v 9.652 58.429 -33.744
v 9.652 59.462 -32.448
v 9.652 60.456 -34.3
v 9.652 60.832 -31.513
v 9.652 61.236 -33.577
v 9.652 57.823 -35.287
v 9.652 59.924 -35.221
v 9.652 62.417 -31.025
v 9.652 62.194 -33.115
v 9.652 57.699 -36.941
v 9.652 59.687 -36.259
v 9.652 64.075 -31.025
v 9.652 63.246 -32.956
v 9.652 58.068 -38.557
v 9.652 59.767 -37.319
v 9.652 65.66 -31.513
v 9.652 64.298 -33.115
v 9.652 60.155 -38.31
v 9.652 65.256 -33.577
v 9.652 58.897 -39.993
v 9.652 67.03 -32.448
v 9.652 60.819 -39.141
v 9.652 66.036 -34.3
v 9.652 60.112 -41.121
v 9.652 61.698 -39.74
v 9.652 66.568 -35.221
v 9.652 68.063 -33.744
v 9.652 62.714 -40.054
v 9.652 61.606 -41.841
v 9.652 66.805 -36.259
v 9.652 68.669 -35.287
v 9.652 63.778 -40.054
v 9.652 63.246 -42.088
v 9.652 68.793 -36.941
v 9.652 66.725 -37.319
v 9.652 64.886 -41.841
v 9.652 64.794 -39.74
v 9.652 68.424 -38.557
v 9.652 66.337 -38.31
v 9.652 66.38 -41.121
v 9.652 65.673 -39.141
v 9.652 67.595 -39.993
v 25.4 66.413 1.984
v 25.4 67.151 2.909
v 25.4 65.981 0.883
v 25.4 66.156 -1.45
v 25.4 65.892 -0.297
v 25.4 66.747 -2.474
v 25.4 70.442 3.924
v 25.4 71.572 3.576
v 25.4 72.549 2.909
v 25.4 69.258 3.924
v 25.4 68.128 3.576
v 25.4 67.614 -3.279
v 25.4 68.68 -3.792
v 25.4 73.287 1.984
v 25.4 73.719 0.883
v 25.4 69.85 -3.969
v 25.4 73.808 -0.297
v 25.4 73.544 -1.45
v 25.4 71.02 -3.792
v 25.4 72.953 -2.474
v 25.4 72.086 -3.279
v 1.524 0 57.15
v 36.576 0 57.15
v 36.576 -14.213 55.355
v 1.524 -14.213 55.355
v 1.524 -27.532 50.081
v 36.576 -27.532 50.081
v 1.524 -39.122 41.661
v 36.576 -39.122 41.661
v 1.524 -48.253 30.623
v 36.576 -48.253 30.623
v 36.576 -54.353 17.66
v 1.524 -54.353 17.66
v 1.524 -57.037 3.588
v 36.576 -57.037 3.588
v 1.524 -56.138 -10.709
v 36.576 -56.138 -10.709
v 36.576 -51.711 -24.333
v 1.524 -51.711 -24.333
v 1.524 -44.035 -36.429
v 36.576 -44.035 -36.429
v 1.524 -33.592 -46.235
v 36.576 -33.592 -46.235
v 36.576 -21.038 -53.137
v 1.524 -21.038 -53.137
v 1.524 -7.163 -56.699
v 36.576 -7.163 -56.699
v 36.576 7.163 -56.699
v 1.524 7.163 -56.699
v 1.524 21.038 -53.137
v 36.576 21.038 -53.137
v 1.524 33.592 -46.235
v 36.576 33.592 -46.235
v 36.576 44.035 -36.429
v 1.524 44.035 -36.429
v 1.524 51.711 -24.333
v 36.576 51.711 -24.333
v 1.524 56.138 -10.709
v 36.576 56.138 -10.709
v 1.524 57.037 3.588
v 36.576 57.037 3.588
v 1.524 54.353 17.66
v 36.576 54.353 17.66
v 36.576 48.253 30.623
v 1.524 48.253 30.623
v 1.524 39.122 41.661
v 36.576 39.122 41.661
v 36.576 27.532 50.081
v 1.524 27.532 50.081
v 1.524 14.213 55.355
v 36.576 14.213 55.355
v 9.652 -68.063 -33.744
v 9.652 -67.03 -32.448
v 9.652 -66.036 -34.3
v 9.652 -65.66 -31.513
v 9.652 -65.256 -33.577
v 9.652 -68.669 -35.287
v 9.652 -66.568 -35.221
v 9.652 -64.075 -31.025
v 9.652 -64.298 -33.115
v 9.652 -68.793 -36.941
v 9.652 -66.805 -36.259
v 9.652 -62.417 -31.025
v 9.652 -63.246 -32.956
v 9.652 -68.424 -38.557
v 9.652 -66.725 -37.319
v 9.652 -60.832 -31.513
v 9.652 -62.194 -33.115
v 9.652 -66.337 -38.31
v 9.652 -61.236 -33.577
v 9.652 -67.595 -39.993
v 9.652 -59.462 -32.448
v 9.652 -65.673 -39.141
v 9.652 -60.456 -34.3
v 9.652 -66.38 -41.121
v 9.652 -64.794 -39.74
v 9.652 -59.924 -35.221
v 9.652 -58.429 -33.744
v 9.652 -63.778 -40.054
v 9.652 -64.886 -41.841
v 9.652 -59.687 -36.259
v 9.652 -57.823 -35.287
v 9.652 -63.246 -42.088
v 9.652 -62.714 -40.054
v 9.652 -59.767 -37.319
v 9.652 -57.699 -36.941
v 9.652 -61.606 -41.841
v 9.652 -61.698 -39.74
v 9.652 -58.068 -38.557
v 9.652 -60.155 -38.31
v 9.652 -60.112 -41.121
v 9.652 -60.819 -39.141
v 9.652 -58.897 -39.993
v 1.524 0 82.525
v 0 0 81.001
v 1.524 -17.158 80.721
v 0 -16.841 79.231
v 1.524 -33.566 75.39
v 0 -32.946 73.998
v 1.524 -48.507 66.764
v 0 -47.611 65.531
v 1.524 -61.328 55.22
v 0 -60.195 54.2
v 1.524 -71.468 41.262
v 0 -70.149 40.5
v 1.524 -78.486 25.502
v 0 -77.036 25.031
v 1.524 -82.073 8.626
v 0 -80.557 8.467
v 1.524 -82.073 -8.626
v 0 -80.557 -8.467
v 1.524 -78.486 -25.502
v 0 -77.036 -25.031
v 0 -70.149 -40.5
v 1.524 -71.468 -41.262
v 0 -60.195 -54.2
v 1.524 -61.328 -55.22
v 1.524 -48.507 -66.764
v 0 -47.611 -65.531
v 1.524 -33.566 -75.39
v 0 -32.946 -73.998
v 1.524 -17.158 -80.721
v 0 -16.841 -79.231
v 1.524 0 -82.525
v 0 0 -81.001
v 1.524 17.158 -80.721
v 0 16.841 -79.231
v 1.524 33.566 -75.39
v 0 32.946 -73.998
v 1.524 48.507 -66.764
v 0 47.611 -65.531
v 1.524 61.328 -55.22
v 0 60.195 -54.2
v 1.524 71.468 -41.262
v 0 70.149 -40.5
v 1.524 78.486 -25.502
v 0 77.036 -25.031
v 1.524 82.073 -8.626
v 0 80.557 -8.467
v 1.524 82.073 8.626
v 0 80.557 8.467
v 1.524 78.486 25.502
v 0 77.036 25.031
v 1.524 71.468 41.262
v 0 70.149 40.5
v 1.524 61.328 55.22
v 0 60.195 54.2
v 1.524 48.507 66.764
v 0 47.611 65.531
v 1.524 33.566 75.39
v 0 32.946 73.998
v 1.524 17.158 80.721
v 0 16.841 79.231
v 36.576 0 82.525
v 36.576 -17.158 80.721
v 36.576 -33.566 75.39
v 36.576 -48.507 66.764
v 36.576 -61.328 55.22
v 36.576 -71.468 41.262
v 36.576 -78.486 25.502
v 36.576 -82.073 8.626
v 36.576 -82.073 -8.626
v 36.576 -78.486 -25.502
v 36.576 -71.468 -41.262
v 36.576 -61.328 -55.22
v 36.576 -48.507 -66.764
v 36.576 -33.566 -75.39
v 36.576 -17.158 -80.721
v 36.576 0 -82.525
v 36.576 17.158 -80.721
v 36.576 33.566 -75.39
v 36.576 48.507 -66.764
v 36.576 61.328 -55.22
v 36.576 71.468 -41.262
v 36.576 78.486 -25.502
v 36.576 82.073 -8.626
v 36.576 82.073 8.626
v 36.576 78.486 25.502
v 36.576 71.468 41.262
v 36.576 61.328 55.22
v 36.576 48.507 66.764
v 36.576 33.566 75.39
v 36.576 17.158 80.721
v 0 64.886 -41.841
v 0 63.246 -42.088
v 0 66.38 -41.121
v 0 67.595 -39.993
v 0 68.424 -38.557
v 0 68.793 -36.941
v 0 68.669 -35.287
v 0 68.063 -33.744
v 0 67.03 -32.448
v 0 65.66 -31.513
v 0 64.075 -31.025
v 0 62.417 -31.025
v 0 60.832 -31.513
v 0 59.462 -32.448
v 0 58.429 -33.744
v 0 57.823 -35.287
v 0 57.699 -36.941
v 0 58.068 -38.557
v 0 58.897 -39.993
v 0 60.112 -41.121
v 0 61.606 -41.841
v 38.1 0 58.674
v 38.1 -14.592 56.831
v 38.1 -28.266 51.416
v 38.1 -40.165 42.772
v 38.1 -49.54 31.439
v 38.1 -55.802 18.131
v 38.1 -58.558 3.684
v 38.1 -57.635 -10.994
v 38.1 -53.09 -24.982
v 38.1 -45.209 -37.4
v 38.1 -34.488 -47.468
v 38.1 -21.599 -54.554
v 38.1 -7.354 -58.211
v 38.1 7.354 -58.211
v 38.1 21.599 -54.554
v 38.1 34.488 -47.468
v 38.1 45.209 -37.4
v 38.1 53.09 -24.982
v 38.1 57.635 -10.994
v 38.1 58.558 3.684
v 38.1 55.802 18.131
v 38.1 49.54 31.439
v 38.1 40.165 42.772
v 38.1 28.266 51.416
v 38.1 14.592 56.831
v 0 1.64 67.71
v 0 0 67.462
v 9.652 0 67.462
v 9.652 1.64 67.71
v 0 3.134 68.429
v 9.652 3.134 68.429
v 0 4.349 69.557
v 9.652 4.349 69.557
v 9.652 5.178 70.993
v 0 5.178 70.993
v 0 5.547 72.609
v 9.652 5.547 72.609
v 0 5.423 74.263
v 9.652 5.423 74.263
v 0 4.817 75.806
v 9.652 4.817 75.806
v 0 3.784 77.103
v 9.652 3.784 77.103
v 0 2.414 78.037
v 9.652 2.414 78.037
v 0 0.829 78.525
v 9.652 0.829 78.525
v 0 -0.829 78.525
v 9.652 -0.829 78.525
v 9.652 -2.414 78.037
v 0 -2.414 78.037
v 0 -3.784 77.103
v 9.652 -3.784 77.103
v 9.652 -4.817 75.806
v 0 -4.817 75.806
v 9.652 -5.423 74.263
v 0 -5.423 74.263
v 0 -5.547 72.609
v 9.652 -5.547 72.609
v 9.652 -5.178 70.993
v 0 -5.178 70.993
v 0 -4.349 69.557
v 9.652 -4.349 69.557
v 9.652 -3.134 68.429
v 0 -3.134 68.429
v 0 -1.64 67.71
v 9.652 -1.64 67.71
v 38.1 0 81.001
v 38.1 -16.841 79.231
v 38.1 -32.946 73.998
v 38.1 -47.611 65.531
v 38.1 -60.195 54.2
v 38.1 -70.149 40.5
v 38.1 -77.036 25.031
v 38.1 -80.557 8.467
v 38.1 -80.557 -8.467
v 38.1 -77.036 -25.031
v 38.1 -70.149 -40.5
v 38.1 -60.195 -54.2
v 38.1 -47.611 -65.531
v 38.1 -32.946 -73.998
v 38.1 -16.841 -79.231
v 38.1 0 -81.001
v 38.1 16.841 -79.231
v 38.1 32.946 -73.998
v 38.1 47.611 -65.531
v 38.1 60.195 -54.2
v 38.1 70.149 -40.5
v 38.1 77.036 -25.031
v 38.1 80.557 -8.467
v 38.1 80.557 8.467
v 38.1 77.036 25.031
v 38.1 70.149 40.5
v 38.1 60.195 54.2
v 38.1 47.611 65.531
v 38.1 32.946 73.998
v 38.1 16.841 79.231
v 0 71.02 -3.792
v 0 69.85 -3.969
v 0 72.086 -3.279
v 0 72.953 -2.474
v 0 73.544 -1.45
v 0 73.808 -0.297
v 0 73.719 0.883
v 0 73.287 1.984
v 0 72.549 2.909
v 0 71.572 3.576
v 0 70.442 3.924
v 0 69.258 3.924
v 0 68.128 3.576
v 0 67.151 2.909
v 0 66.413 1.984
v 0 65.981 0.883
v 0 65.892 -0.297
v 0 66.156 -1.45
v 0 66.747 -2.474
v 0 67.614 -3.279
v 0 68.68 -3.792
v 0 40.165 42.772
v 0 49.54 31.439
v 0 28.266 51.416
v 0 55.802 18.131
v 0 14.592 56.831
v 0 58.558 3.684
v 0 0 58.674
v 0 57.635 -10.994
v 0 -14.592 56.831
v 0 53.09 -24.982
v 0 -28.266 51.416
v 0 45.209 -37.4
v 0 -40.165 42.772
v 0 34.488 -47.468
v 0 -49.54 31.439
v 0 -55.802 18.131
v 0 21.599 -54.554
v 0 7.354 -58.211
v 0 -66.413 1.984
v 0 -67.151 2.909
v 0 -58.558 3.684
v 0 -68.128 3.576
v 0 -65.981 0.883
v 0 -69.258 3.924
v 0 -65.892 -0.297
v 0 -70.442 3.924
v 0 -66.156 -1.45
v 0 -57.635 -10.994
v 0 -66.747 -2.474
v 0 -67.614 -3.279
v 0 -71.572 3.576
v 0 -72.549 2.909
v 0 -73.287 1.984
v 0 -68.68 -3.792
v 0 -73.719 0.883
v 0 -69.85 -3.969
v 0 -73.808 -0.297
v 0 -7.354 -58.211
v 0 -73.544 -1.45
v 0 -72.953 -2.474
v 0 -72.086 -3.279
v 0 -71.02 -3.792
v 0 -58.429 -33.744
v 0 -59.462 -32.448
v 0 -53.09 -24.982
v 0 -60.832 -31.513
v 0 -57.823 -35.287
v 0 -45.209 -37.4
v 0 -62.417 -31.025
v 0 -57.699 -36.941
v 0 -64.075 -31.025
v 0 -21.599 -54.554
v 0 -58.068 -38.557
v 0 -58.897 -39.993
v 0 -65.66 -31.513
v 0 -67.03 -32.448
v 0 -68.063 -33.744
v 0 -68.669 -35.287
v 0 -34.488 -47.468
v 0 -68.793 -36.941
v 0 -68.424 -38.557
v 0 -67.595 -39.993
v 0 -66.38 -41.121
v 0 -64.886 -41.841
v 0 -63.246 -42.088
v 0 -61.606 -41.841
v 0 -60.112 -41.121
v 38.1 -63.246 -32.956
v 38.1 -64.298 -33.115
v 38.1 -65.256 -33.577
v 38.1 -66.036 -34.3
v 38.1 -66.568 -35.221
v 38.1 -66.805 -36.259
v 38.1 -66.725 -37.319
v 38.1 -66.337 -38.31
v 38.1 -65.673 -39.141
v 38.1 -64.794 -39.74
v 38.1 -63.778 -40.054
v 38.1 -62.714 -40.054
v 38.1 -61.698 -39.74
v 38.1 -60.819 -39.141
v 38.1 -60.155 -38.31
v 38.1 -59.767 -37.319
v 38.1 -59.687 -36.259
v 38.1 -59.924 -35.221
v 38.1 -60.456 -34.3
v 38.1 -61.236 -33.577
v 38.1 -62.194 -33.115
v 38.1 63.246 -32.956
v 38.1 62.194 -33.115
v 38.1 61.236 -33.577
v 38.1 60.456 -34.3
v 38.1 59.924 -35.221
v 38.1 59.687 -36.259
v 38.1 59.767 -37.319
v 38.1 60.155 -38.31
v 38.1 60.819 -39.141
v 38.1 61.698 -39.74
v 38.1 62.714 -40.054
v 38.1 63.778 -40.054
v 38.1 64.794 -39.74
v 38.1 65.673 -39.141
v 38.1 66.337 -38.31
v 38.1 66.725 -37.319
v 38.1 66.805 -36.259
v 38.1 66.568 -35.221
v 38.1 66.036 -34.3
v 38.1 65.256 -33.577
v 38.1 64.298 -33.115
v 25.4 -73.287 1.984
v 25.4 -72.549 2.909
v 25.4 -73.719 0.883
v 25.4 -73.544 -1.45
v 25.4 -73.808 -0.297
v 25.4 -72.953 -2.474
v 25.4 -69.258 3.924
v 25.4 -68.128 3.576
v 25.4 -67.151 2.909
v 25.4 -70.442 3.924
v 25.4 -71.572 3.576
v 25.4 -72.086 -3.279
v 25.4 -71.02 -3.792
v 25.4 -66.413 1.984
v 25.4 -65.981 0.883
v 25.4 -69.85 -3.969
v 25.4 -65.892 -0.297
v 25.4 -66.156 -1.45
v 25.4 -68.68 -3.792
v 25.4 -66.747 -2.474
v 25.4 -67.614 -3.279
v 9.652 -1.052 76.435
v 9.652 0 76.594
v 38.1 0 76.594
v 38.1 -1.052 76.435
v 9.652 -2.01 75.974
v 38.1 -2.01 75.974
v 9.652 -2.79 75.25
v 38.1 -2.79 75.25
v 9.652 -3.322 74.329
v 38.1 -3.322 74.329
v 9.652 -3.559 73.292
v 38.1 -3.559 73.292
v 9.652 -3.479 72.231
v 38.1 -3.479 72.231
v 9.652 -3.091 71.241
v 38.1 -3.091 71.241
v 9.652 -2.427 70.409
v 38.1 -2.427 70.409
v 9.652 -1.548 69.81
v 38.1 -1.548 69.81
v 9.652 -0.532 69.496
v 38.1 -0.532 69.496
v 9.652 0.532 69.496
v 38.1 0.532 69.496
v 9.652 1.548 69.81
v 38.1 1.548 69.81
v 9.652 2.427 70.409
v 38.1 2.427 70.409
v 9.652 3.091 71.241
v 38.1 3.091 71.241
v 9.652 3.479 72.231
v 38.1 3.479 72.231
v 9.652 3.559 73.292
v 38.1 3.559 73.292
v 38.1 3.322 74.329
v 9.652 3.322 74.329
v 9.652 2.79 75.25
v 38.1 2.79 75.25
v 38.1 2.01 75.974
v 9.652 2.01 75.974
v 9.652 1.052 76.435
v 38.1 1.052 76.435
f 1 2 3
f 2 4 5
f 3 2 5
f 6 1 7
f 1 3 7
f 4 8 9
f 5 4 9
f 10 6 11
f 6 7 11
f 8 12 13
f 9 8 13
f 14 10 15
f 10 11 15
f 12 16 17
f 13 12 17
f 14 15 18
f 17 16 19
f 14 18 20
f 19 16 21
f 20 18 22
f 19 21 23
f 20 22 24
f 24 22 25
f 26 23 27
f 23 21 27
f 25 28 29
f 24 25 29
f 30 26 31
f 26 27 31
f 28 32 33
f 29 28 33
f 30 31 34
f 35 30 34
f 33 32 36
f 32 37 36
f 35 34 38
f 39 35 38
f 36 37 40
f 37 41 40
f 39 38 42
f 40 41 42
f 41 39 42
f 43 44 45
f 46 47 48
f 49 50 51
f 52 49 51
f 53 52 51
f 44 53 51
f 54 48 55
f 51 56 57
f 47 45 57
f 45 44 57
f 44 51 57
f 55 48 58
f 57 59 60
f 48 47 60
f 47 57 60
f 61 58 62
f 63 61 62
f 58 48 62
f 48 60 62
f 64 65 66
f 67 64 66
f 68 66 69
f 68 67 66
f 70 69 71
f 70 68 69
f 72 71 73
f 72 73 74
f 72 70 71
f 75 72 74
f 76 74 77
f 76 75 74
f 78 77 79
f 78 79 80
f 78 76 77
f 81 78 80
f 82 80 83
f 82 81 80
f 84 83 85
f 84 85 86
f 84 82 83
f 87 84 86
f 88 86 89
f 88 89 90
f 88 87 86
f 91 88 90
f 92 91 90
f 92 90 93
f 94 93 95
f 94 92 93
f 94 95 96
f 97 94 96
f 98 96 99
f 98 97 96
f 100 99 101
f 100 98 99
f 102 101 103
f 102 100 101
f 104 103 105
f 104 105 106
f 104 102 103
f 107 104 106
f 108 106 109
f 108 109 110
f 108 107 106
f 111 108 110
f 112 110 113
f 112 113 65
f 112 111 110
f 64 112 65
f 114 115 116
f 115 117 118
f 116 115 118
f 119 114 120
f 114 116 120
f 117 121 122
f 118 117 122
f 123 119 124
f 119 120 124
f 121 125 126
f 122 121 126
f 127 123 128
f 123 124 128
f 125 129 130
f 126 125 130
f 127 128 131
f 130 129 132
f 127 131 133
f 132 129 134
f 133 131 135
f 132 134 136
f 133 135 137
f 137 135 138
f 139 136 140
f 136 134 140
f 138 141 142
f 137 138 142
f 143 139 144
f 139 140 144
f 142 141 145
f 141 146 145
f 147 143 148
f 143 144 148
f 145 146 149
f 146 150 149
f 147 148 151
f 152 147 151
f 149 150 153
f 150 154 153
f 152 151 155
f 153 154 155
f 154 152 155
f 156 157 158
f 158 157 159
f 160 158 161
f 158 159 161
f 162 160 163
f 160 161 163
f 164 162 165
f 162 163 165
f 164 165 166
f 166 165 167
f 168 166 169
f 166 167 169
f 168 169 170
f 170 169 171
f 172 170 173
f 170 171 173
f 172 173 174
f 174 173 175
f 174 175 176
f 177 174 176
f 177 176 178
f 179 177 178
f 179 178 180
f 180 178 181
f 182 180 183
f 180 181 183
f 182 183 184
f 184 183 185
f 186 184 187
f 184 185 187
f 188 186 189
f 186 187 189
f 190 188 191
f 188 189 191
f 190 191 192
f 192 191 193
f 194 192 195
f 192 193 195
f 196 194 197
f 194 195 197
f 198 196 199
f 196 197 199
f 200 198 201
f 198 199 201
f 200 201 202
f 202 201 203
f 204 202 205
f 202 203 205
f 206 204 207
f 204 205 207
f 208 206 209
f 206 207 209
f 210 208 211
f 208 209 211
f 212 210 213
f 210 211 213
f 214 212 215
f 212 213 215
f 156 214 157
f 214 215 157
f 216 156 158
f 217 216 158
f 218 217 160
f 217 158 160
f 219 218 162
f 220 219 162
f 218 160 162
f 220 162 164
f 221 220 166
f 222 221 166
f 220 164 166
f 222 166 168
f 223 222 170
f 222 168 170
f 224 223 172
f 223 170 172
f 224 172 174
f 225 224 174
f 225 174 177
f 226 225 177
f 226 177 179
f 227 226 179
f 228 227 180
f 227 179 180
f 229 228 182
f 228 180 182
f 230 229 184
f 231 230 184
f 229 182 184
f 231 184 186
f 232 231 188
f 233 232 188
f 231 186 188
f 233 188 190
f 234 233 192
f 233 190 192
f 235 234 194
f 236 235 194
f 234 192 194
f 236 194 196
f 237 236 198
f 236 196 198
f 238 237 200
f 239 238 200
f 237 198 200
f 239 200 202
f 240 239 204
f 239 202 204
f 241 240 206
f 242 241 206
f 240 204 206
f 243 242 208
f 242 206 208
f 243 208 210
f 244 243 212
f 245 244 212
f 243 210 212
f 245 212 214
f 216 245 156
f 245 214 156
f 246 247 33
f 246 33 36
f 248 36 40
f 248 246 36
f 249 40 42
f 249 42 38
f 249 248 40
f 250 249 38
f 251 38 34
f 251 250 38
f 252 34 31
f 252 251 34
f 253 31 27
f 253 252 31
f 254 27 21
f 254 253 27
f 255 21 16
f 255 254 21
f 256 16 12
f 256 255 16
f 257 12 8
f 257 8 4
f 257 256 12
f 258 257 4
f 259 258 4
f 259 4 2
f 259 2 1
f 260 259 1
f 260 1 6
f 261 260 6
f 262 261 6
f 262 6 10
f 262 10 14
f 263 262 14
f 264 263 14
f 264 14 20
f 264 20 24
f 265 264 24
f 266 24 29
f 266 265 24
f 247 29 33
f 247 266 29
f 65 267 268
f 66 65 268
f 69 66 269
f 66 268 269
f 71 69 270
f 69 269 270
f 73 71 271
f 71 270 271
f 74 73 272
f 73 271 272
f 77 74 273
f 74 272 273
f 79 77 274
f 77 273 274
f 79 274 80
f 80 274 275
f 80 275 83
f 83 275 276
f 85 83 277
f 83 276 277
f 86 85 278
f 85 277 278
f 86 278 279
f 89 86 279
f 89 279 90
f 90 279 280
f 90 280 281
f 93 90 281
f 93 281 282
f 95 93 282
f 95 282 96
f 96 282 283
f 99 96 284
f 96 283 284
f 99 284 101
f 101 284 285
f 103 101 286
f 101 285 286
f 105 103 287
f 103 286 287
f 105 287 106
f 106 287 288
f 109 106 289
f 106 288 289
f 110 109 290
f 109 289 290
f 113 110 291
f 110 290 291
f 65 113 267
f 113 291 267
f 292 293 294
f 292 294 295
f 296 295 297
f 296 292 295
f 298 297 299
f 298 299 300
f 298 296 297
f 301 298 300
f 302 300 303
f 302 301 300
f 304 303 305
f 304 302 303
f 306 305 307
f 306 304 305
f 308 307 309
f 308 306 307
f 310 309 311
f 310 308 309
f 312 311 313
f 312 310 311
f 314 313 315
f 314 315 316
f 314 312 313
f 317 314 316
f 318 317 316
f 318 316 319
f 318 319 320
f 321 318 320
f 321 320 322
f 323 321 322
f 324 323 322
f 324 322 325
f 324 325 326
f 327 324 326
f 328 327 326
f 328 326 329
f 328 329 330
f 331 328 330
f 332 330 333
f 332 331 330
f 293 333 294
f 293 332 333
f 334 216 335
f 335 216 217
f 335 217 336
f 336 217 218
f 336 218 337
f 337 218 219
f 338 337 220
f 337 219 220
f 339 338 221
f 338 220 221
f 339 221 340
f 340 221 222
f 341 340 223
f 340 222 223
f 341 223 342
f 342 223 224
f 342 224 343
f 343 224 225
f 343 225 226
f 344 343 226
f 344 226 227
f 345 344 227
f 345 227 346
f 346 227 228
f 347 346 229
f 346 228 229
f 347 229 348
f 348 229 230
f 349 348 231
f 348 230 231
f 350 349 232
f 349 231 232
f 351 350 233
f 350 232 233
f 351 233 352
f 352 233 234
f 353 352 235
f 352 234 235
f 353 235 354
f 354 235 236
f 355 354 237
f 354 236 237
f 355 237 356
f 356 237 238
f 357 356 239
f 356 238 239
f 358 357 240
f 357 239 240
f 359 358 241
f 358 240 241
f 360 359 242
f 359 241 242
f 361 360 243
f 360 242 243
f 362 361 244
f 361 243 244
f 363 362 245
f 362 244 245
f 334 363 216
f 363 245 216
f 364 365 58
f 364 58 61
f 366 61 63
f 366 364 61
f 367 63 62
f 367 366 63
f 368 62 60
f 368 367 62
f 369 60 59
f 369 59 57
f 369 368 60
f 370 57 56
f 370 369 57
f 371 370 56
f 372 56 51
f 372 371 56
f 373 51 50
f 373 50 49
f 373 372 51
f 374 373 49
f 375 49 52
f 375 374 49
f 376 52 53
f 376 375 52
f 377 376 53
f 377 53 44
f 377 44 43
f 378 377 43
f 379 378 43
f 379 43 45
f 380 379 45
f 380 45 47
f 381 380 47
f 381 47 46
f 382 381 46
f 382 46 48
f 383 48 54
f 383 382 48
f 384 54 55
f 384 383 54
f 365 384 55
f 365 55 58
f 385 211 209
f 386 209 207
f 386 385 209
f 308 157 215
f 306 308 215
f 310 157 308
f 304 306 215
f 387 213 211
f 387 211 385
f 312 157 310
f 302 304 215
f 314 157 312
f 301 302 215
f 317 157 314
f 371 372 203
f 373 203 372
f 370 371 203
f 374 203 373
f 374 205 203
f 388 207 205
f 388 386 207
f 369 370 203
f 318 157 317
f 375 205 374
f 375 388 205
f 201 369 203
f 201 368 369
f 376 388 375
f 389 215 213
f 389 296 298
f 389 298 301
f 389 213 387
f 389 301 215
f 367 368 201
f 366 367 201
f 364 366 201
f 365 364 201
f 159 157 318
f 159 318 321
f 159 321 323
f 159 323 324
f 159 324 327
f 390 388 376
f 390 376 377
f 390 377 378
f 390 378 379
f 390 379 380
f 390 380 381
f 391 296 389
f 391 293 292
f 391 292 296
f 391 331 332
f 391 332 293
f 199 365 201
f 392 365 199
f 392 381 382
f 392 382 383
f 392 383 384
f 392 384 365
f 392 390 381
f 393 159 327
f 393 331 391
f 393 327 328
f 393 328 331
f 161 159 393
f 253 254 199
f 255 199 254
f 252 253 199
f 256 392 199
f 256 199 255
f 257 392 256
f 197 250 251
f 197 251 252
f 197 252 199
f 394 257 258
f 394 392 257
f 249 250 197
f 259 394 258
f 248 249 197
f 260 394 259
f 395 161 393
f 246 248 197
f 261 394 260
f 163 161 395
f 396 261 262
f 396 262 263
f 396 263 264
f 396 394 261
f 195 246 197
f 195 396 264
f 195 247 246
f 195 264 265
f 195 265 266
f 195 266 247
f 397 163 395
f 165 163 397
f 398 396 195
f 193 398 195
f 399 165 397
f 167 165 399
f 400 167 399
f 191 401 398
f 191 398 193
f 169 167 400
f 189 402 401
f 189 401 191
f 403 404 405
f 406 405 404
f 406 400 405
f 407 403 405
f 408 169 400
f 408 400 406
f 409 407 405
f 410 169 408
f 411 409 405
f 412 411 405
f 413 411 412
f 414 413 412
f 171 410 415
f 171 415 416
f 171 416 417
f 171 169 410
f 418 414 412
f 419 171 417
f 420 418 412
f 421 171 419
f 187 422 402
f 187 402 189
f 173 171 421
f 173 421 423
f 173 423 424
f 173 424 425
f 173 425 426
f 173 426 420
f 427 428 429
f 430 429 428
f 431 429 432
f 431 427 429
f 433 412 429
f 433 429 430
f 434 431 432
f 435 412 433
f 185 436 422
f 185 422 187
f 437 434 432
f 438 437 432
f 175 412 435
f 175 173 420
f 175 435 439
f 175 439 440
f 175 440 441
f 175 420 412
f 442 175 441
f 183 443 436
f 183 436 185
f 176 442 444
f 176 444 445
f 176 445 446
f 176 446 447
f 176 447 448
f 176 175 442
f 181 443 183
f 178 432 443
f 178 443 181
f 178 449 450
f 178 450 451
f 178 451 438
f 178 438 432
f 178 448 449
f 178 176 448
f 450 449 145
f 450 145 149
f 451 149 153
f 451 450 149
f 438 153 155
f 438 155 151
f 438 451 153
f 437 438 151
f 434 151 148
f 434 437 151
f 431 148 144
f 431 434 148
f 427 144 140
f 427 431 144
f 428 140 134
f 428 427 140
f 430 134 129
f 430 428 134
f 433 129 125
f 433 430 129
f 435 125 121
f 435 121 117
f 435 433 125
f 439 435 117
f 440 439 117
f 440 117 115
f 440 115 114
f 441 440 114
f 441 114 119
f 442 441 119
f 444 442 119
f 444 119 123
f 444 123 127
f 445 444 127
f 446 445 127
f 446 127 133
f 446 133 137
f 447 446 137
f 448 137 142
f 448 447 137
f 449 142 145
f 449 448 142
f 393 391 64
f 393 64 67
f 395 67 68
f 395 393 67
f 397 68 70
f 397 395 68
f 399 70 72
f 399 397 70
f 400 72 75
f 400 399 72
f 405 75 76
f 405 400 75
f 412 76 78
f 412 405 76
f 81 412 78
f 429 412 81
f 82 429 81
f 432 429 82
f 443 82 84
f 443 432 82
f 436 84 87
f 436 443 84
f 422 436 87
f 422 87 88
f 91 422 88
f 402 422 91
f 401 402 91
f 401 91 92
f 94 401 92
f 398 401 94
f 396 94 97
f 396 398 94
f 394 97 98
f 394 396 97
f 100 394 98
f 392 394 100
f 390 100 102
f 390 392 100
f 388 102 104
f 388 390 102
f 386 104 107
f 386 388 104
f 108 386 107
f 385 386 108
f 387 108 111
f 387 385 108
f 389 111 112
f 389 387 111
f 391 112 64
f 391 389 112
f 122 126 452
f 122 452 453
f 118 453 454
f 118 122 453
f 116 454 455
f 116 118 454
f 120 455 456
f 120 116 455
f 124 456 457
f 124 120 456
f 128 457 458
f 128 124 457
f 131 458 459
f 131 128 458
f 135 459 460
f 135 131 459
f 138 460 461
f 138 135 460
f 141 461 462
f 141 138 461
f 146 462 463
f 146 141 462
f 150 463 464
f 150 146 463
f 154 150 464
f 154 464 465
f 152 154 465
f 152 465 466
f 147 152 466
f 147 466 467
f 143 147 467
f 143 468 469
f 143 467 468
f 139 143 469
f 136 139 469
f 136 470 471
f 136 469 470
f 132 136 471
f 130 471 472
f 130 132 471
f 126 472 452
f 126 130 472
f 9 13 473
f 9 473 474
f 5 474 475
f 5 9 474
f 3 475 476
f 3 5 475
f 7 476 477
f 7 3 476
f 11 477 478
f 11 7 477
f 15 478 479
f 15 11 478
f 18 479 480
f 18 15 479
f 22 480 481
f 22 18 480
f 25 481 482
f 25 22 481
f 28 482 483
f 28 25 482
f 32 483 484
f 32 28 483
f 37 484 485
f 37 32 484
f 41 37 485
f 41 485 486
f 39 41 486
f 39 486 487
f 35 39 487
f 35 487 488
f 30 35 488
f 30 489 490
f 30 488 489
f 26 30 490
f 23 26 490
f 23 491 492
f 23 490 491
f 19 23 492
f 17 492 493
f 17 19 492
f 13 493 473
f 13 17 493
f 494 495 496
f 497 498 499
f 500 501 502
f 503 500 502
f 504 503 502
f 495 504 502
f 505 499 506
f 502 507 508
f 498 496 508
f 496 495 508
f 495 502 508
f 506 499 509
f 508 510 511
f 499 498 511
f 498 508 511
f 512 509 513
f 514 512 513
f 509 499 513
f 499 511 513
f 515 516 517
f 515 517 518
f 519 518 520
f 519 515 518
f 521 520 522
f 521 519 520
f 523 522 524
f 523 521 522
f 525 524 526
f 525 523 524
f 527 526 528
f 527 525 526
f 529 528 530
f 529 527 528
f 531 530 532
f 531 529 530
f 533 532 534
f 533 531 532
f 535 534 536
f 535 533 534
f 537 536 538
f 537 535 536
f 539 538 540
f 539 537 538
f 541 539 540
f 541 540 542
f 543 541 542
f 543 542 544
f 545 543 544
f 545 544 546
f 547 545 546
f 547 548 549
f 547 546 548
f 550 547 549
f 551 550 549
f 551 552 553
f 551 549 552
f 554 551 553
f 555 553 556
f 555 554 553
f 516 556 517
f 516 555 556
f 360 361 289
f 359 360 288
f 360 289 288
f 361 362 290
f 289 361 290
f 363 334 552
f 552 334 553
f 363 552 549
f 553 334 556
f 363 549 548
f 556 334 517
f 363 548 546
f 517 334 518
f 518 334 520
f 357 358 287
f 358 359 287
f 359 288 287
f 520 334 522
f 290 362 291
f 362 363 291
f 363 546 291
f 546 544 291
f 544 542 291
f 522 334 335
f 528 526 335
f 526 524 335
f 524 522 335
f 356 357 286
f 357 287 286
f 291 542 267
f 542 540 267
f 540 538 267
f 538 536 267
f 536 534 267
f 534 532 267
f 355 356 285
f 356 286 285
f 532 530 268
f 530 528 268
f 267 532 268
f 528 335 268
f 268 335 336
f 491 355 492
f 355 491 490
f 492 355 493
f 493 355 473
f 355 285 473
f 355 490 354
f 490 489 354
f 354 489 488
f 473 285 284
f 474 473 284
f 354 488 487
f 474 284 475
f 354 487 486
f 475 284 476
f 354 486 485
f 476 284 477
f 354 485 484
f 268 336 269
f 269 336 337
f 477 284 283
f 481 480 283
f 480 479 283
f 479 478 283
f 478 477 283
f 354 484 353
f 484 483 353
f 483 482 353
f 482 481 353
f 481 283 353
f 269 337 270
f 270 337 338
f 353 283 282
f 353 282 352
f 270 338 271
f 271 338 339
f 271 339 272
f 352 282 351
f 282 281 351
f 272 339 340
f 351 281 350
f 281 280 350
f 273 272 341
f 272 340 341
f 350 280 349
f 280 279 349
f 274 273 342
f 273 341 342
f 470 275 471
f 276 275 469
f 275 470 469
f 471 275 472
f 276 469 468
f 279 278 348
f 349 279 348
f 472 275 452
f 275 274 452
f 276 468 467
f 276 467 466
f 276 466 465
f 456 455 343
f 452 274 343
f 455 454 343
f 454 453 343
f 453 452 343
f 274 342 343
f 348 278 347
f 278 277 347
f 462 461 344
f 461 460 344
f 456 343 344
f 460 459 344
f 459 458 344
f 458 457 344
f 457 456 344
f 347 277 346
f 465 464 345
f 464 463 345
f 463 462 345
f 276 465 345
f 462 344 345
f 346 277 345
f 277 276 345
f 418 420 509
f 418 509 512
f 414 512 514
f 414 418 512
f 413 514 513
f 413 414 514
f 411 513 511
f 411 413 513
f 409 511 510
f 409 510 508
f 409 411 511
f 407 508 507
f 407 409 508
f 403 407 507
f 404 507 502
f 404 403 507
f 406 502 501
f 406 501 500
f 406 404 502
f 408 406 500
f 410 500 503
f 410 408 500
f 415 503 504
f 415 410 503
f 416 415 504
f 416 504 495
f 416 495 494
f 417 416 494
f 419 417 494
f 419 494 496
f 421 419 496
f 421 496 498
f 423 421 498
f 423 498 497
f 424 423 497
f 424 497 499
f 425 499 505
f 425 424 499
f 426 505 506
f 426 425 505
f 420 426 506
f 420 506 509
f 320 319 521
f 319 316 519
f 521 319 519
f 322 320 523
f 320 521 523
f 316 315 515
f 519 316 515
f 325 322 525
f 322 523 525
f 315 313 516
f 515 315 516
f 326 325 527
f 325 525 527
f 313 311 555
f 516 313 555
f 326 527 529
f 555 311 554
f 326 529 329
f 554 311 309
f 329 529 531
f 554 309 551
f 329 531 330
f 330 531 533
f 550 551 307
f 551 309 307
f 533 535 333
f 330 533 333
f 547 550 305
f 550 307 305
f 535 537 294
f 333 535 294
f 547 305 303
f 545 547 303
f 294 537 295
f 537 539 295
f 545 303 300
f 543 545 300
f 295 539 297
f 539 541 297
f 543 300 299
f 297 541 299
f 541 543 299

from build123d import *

# Parameters (mm, degrees)
SKETCH1_W           = 25.3746
SKETCH1_H           = 38.1
CHAMFER1_SIZE       = 1.524
SKETCH2_R           = 3.5687
CUT_EXTRUDE2_DEPTH  = 76.2
SKETCH3_R           = 5.5626
CUT_EXTRUDE4_DEPTH  = 9.652
SKETCH4_R           = 3.5687
CUT_EXTRUDE6_DEPTH  = 76.2
SKETCH5_R           = 5.5626
CUT_EXTRUDE8_DEPTH  = 9.652
SKETCH6_R           = 3.5687
CUT_EXTRUDE10_DEPTH = 76.2
SKETCH7_R           = 5.5626
CUT_EXTRUDE12_DEPTH = 9.652
SKETCH8_R           = 3.96875
CUT_EXTRUDE14_DEPTH = 25.4
SKETCH9_R           = 3.96875
CUT_EXTRUDE16_DEPTH = 25.4


with BuildPart() as part:
    # Sketch1 → Revolve1 (revolve)
    with BuildSketch(Plane(origin=(0, 0, 0), x_dir=(0, 1, 0), z_dir=(0, 0, 1)), mode=Mode.PRIVATE) as revolve1_sk:
        with Locations((69.8373, -19.05)):
            Rectangle(SKETCH1_W, SKETCH1_H)
    revolve(revolve1_sk.sketch.rotate(Axis((-25.4, 0, 0), (1, 0, 0)), 90), axis=Axis((-25.4, 0, 0), (1, 0, 0)))

    # Chamfer1
    chamfer1_edges = [part.edges().sort_by_distance(p)[0] for p in [
        (0, 0, -57.15),
        (38.1, 0, -57.15),
        (38.1, 0, -82.5246),
        (0, 0, -82.5246),
    ]]
    chamfer(chamfer1_edges, length=CHAMFER1_SIZE)

    # Sketch2 → Cut-Extrude2 (cut)
    with BuildSketch(Plane.YZ):
        with Locations(Location((0, 73.025, 0), (0, 0, 90))):
            Circle(SKETCH2_R)
    extrude(amount=CUT_EXTRUDE2_DEPTH, mode=Mode.SUBTRACT)

    # Sketch3 → Cut-Extrude4 (cut)
    with BuildSketch(Plane.YZ):
        with Locations(Location((0, 73.025, 0), (0, 0, 270))):
            Circle(SKETCH3_R)
    extrude(amount=CUT_EXTRUDE4_DEPTH, mode=Mode.SUBTRACT)

    # Sketch4 → Cut-Extrude6 (cut)
    with BuildSketch(Plane.YZ):
        with Locations(Location((-63.246, -36.5252, 0), (0, 0, 90))):
            Circle(SKETCH4_R)
    extrude(amount=CUT_EXTRUDE6_DEPTH, mode=Mode.SUBTRACT)

    # Sketch5 → Cut-Extrude8 (cut)
    with BuildSketch(Plane.YZ):
        with Locations(Location((-63.246, -36.5252, 0), (0, 0, 270))):
            Circle(SKETCH5_R)
    extrude(amount=CUT_EXTRUDE8_DEPTH, mode=Mode.SUBTRACT)

    # Sketch6 → Cut-Extrude10 (cut)
    with BuildSketch(Plane.YZ):
        with Locations(Location((63.246, -36.5252, 0), (0, 0, 90))):
            Circle(SKETCH6_R)
    extrude(amount=CUT_EXTRUDE10_DEPTH, mode=Mode.SUBTRACT)

    # Sketch7 → Cut-Extrude12 (cut)
    with BuildSketch(Plane.YZ):
        with Locations(Location((63.246, -36.5252, 0), (0, 0, 270))):
            Circle(SKETCH7_R)
    extrude(amount=CUT_EXTRUDE12_DEPTH, mode=Mode.SUBTRACT)

    # Sketch8 → Cut-Extrude14 (cut)
    with BuildSketch(Plane.YZ):
        with Locations(Location((-69.85, 0, 0), (0, 0, 270))):
            Circle(SKETCH8_R)
    extrude(amount=CUT_EXTRUDE14_DEPTH, mode=Mode.SUBTRACT)

    # Sketch9 → Cut-Extrude16 (cut)
    with BuildSketch(Plane.YZ):
        with Locations(Location((69.85, 0, 0), (0, 0, 270))):
            Circle(SKETCH9_R)
    extrude(amount=CUT_EXTRUDE16_DEPTH, mode=Mode.SUBTRACT)


solid = part.part
